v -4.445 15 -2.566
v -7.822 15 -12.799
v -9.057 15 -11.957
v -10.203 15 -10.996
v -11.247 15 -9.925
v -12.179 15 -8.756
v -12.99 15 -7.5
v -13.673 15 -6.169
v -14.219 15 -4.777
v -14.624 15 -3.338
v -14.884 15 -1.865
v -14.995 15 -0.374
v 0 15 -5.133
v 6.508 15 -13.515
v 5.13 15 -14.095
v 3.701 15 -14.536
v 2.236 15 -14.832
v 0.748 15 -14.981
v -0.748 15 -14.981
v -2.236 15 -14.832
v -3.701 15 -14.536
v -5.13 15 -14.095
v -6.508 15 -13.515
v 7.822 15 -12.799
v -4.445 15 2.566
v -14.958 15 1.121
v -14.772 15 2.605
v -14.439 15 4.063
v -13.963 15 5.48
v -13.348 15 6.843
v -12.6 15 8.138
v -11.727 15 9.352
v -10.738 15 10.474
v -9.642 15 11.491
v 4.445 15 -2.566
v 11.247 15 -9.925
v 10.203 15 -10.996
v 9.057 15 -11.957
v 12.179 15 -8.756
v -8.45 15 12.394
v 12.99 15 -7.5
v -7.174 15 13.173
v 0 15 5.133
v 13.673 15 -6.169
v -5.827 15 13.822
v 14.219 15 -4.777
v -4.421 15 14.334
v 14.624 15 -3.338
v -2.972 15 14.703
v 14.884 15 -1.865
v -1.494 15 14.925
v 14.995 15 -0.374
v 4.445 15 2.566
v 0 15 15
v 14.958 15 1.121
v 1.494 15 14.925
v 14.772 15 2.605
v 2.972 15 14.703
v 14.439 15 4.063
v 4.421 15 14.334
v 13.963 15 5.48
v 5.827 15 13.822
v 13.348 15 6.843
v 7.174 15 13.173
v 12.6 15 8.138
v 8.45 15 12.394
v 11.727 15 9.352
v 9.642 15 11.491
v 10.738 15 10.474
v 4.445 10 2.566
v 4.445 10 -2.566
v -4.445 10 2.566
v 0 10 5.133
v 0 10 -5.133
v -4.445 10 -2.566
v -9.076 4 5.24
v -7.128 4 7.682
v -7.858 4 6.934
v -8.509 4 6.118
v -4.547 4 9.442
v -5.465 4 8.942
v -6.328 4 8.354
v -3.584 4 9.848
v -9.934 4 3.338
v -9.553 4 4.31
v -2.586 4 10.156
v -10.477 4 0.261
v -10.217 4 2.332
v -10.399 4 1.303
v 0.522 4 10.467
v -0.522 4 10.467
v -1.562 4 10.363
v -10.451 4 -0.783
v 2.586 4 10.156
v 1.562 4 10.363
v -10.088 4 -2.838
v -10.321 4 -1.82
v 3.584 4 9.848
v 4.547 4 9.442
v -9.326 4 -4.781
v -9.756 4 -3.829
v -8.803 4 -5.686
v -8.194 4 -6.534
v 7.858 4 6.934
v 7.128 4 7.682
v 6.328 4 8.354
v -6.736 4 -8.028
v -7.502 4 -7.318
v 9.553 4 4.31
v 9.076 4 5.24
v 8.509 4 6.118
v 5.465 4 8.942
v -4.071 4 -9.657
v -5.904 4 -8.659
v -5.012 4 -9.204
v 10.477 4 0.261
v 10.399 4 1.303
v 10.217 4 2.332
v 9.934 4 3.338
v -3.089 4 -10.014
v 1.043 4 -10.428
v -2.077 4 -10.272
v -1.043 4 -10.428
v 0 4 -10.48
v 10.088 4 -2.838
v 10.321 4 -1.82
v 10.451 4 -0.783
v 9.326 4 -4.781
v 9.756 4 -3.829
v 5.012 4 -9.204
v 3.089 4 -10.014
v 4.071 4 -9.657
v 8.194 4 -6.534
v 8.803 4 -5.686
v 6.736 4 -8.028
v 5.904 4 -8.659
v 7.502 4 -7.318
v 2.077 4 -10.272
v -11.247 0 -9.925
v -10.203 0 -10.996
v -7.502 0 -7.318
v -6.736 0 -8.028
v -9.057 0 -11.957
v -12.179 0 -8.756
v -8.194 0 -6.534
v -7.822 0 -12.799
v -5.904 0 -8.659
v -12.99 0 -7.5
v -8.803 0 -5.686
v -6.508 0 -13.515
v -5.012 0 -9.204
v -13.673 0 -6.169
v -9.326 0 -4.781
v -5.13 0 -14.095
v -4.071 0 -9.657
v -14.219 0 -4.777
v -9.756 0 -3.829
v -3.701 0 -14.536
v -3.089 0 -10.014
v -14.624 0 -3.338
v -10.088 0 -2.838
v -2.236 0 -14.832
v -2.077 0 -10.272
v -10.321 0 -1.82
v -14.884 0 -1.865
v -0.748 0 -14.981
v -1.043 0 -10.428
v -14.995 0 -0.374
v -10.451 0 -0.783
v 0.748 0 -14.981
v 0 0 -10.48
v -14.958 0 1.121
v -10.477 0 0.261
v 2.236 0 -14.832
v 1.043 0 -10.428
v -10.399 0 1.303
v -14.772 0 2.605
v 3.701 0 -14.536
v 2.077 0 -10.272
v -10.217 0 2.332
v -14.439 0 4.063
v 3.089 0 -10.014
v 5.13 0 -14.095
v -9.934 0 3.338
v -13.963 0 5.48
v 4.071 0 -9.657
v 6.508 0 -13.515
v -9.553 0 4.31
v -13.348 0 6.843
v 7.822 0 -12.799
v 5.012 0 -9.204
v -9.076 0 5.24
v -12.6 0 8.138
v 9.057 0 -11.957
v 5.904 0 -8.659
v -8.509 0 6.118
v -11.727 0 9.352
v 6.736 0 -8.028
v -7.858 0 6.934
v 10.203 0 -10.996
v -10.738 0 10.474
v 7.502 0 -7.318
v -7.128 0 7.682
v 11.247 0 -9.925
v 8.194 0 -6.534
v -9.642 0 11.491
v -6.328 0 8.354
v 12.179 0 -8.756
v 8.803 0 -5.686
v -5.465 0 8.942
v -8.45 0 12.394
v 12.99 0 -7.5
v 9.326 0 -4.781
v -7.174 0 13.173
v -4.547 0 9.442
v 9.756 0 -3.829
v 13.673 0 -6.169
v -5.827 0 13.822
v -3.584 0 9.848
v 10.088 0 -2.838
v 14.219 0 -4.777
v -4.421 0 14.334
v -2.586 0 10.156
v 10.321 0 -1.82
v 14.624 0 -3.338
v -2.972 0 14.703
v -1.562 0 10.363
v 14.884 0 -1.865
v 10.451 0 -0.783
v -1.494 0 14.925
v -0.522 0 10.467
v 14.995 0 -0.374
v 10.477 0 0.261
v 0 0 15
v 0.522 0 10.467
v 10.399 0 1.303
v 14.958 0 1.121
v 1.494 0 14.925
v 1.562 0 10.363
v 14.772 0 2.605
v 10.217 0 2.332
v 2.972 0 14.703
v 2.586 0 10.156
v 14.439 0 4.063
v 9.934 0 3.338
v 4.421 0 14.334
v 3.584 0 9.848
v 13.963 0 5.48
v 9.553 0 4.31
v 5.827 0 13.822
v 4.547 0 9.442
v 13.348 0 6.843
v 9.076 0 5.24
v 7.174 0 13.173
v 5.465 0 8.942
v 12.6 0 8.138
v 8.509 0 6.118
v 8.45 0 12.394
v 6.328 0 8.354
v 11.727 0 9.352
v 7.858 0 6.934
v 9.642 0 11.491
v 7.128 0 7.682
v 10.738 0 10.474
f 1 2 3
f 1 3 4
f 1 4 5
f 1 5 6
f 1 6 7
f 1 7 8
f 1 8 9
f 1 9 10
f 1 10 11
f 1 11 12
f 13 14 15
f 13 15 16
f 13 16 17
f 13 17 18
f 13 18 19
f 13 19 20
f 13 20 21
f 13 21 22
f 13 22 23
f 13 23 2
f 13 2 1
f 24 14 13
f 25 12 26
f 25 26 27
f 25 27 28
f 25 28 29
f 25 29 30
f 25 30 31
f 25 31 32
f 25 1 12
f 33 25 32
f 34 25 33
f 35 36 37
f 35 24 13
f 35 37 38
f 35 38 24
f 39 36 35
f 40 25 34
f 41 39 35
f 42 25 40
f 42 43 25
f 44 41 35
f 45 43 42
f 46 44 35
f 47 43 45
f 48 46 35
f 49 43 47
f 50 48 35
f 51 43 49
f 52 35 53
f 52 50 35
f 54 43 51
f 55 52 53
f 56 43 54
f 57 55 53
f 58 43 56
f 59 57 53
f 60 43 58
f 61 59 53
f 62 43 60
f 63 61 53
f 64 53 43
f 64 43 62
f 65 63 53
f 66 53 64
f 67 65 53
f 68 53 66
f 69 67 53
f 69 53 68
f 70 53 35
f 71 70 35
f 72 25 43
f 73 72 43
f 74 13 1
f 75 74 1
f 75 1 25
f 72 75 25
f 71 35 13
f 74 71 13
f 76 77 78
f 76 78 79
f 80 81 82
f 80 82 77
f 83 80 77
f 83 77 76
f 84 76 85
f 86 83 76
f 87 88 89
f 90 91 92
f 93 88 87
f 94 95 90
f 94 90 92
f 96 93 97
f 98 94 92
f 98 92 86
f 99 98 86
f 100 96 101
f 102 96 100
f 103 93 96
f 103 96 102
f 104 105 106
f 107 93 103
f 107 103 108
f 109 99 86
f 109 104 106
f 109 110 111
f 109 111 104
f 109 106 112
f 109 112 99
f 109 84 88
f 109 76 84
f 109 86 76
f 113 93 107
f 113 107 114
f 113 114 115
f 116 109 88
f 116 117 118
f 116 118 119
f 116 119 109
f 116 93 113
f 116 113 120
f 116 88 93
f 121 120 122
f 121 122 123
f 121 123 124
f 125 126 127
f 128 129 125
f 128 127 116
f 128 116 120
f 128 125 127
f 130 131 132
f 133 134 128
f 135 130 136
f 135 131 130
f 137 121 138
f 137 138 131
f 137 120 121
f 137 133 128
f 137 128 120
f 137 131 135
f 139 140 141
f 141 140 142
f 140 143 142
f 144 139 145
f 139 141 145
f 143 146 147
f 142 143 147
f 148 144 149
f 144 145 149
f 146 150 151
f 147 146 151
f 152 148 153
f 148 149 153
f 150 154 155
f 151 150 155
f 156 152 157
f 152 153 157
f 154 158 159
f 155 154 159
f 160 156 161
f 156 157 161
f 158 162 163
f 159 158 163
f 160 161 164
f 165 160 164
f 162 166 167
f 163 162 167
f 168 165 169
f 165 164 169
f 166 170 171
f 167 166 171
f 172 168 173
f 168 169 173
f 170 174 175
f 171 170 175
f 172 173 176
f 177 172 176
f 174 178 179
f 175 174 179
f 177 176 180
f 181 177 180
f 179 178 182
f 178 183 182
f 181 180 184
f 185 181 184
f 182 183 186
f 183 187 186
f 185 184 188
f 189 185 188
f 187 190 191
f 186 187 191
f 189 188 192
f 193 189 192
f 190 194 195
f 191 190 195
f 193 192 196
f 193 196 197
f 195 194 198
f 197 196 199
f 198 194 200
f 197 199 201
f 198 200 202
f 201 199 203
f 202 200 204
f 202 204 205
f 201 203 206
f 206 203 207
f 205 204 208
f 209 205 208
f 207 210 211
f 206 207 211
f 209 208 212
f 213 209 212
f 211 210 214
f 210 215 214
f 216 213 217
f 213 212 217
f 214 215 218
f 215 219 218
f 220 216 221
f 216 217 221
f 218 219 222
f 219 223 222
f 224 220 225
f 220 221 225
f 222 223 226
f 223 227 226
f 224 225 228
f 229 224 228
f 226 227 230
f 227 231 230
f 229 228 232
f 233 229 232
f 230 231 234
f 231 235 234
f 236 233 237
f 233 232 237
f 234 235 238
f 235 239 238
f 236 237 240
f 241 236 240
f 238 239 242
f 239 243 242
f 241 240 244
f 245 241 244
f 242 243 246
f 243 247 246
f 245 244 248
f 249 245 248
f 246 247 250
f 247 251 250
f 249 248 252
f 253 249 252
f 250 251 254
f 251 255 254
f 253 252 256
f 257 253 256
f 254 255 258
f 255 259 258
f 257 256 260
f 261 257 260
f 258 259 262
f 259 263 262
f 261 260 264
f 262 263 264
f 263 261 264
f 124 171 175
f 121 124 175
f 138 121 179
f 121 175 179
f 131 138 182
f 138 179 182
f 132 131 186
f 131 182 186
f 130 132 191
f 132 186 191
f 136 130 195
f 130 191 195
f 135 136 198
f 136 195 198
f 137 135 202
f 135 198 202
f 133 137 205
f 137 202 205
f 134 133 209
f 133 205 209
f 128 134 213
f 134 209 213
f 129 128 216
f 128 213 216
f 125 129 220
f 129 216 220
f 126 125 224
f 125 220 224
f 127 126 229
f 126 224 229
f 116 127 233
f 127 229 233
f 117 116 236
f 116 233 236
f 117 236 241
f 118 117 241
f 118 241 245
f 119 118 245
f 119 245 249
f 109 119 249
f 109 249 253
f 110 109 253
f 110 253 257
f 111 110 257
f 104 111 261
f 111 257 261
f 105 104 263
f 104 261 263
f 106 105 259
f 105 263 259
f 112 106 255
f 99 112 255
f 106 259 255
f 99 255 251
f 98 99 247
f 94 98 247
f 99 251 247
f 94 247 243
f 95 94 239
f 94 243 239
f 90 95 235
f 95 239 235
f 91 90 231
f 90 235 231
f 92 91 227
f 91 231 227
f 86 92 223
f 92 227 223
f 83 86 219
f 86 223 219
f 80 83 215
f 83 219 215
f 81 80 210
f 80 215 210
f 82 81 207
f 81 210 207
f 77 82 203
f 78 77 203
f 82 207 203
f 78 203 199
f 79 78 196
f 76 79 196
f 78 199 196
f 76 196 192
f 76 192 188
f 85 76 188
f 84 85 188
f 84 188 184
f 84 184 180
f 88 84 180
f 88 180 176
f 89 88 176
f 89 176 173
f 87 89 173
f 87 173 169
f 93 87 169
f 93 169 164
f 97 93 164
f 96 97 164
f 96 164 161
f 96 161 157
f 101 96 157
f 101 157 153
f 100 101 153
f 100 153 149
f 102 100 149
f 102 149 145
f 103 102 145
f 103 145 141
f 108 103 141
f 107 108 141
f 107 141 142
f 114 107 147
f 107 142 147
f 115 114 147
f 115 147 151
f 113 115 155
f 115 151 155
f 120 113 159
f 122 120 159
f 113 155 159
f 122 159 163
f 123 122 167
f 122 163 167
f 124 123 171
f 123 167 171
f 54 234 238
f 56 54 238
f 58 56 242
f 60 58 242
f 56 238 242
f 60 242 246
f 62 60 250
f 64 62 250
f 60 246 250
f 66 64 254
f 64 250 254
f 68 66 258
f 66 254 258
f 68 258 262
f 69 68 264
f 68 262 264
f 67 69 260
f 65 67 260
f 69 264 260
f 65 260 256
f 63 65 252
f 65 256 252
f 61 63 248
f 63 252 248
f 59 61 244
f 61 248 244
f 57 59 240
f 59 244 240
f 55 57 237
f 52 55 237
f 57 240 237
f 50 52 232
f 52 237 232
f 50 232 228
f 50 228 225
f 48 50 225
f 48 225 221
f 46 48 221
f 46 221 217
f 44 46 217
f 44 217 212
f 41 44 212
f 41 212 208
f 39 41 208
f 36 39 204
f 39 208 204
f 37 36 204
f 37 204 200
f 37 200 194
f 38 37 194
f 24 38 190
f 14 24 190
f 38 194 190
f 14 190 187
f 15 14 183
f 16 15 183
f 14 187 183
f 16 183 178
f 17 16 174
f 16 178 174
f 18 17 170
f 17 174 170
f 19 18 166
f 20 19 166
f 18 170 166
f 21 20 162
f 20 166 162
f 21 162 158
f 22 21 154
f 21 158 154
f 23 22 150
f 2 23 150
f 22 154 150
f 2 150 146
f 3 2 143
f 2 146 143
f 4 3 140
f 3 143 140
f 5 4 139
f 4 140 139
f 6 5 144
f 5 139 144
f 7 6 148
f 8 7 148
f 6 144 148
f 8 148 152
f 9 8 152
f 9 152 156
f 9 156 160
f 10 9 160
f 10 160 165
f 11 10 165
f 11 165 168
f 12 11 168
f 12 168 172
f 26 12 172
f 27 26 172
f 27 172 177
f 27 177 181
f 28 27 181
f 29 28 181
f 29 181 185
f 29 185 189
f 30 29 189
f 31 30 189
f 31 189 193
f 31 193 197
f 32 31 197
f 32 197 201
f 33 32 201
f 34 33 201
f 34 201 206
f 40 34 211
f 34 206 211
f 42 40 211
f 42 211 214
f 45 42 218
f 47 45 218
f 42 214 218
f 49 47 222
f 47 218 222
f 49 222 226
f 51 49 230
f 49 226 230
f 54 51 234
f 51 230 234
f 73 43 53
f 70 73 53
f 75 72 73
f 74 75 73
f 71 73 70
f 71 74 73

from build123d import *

# Parameters (mm, degrees)
SKETCH1_R           = 15
BOSS_EXTRUDE1_DEPTH = 15
SKETCH2_R           = 10.48
CUT_EXTRUDE1_DEPTH  = 4
CUT_EXTRUDE2_DEPTH  = 5


with BuildPart() as part:
    # Sketch1 → Boss-Extrude1 (new body)
    with BuildSketch(Plane(origin=(0, 0, 0), x_dir=(1, 0, 0), z_dir=(0, 1, 0))):
        with Locations(Location((0, 0, 0), (0, 0, 270))):
            Circle(SKETCH1_R)
    extrude(amount=BOSS_EXTRUDE1_DEPTH)

    # Sketch2 → Cut-Extrude1 (cut)
    with BuildSketch(Plane.XZ):
        with Locations(Location((0, 0, 0), (0, 0, 270))):
            Circle(SKETCH2_R)
    extrude(amount=-CUT_EXTRUDE1_DEPTH, mode=Mode.SUBTRACT)

    # Sketch7 → Cut-Extrude2 (cut)
    with BuildSketch(Plane(origin=(0, 15, 0), x_dir=(1, 0, 0), z_dir=(0, 1, 0))):
        Polygon((0, 5.132643893), (-4.445, 2.566321947), (-4.445, -2.566321947), (0, -5.132643893), (4.445, -2.566321947), (4.445, 2.566321947), align=None)
    extrude(amount=-CUT_EXTRUDE2_DEPTH, mode=Mode.SUBTRACT)


solid = part.part
